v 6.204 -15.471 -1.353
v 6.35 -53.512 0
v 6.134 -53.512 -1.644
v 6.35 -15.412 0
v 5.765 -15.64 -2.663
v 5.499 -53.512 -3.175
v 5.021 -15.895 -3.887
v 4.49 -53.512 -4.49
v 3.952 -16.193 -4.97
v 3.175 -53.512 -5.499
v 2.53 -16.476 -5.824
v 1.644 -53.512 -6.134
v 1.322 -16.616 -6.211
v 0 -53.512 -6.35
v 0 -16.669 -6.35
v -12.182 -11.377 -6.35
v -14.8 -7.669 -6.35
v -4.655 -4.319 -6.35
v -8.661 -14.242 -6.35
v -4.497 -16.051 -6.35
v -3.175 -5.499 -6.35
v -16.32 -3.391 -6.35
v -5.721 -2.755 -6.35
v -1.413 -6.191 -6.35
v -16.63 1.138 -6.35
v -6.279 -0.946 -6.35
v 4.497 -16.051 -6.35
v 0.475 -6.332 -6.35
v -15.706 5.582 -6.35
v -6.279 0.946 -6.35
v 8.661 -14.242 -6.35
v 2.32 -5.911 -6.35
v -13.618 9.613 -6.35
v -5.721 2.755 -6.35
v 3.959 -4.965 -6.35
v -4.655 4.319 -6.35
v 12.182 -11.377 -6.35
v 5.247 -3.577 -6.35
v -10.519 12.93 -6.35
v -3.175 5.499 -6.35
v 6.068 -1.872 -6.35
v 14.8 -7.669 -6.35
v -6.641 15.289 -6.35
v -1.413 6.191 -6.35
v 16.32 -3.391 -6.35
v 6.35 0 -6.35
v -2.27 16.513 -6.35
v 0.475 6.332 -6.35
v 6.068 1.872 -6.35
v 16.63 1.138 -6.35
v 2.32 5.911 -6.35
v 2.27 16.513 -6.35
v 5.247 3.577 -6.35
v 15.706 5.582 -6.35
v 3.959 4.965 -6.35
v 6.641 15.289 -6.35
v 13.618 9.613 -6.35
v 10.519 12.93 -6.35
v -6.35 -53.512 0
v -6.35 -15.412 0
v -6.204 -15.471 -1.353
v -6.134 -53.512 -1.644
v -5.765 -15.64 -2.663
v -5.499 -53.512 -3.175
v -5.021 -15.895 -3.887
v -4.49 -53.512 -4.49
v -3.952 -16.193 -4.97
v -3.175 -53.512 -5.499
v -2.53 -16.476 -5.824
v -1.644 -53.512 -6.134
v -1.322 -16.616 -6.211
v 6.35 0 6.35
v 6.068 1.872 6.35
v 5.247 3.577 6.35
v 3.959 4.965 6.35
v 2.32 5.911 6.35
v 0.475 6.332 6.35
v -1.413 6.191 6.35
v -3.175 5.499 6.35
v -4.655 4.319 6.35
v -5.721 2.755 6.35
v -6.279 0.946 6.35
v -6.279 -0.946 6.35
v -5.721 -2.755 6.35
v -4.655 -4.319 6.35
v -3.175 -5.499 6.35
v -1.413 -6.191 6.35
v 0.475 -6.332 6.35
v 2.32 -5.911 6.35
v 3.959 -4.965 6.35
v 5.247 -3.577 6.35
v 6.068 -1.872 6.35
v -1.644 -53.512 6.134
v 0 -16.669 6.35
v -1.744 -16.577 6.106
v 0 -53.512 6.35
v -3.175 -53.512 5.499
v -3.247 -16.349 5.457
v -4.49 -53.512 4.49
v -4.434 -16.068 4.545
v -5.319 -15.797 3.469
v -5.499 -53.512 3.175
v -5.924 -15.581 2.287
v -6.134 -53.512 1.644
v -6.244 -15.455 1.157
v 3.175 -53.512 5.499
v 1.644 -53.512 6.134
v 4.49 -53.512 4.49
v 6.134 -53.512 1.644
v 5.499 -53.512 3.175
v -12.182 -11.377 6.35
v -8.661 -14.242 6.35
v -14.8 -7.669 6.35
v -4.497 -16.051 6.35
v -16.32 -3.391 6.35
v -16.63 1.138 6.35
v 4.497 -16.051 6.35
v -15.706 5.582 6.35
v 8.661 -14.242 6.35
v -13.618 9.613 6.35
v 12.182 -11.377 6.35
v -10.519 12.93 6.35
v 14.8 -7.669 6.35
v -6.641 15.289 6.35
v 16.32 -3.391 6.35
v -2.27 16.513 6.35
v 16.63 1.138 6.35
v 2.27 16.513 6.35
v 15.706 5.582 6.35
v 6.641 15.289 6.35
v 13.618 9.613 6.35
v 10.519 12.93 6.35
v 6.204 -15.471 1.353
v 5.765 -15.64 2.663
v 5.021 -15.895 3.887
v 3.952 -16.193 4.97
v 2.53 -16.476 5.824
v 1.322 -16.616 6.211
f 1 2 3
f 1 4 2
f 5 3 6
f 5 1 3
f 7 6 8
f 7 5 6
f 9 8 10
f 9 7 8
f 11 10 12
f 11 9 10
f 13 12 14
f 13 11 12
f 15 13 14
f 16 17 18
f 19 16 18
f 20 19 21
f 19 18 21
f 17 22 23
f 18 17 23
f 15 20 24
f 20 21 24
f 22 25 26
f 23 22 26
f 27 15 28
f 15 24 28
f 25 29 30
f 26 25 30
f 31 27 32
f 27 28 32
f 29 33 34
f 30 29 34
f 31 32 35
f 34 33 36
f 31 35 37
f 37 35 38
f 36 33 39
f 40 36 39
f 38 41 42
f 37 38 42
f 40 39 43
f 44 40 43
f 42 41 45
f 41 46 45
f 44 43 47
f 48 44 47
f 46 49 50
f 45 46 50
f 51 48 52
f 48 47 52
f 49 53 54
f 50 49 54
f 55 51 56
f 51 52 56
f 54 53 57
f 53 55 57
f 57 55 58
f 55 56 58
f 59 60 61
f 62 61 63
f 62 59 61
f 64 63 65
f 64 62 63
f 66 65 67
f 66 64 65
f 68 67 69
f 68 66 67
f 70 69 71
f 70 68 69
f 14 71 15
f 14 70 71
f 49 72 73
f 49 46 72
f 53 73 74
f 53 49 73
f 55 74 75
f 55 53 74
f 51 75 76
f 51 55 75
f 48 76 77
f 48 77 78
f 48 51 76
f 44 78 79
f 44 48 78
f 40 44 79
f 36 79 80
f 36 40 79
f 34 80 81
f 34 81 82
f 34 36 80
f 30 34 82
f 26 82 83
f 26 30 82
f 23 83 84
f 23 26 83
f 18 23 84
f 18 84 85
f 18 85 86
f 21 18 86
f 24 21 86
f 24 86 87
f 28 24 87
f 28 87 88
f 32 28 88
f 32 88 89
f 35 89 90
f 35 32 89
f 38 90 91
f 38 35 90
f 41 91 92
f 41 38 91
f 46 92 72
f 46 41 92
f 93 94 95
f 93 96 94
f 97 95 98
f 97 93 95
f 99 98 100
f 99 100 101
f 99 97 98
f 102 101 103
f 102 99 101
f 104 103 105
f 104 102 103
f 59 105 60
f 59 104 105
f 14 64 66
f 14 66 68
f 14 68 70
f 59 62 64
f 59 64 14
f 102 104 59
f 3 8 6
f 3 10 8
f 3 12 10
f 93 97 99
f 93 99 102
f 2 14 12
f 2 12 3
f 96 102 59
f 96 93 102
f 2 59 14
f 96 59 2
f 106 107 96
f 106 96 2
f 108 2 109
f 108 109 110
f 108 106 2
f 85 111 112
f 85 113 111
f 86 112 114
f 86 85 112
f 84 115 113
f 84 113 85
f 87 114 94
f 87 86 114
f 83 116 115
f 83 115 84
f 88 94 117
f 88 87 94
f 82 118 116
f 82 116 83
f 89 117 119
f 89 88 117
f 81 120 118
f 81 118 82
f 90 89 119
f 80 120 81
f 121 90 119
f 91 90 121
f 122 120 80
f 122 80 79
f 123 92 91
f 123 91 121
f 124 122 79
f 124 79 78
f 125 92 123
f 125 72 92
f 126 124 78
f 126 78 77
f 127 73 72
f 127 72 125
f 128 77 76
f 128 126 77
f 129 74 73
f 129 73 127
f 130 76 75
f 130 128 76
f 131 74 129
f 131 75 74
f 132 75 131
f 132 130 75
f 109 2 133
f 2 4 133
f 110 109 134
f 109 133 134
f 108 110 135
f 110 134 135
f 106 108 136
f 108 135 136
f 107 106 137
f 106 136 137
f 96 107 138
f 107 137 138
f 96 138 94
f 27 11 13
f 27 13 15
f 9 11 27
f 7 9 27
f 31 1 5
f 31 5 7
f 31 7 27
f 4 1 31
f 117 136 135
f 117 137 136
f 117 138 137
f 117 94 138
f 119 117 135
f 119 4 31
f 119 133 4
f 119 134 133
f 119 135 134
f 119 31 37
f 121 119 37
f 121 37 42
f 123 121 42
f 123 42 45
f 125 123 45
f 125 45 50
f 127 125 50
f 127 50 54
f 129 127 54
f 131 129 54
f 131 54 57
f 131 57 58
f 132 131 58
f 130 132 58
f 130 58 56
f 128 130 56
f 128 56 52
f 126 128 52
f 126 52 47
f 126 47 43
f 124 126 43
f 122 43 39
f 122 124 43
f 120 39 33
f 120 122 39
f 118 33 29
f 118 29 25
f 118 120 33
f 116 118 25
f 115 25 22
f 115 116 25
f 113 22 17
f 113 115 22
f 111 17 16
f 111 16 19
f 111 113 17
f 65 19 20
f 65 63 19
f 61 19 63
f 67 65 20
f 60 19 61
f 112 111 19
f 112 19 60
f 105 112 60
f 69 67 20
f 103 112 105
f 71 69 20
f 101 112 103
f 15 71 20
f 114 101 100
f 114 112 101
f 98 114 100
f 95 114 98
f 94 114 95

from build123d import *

# Parameters (mm, degrees)
F0_R     = 6.35
F1_DEPTH = 6.35
F2_R     = 6.34999


# Not quite as in the source:
# - a fillet or chamfer is up to 0.001 mm smaller than in the source, because OpenCascade refuses the exact size


with BuildPart() as f1:
    # F0 (on Top) → F1 (new body, symmetric)
    with BuildSketch(Plane.XY):
        with BuildLine():
            ThreePointArc((6.35, -15.4118372222), (0, 16.66875), (-6.35, -15.4118372222))
            Line((-6.35, -15.4118372222), (-6.35, -53.5118372222))
            Line((-6.35, -53.5118372222), (6.35, -53.5118372222))
            Line((6.35, -53.5118372222), (6.35, -15.4118372222))
        make_face()
        Circle(F0_R, mode=Mode.SUBTRACT)
    extrude(amount=F1_DEPTH, both=True)

    # F2 (radius 6.35 in the source; OpenCascade refuses exactly that, so slightly less here)
    f2_edges = [f1.edges().sort_by_distance(p)[0] for p in [
        (-6.35, -34.461837, -6.35),
        (6.35, -34.461837, -6.35),
        (-6.35, -34.461837, 6.35),
        (6.35, -34.461837, 6.35),
    ]]
    fillet(f2_edges, radius=F2_R)


solid = f1.part
